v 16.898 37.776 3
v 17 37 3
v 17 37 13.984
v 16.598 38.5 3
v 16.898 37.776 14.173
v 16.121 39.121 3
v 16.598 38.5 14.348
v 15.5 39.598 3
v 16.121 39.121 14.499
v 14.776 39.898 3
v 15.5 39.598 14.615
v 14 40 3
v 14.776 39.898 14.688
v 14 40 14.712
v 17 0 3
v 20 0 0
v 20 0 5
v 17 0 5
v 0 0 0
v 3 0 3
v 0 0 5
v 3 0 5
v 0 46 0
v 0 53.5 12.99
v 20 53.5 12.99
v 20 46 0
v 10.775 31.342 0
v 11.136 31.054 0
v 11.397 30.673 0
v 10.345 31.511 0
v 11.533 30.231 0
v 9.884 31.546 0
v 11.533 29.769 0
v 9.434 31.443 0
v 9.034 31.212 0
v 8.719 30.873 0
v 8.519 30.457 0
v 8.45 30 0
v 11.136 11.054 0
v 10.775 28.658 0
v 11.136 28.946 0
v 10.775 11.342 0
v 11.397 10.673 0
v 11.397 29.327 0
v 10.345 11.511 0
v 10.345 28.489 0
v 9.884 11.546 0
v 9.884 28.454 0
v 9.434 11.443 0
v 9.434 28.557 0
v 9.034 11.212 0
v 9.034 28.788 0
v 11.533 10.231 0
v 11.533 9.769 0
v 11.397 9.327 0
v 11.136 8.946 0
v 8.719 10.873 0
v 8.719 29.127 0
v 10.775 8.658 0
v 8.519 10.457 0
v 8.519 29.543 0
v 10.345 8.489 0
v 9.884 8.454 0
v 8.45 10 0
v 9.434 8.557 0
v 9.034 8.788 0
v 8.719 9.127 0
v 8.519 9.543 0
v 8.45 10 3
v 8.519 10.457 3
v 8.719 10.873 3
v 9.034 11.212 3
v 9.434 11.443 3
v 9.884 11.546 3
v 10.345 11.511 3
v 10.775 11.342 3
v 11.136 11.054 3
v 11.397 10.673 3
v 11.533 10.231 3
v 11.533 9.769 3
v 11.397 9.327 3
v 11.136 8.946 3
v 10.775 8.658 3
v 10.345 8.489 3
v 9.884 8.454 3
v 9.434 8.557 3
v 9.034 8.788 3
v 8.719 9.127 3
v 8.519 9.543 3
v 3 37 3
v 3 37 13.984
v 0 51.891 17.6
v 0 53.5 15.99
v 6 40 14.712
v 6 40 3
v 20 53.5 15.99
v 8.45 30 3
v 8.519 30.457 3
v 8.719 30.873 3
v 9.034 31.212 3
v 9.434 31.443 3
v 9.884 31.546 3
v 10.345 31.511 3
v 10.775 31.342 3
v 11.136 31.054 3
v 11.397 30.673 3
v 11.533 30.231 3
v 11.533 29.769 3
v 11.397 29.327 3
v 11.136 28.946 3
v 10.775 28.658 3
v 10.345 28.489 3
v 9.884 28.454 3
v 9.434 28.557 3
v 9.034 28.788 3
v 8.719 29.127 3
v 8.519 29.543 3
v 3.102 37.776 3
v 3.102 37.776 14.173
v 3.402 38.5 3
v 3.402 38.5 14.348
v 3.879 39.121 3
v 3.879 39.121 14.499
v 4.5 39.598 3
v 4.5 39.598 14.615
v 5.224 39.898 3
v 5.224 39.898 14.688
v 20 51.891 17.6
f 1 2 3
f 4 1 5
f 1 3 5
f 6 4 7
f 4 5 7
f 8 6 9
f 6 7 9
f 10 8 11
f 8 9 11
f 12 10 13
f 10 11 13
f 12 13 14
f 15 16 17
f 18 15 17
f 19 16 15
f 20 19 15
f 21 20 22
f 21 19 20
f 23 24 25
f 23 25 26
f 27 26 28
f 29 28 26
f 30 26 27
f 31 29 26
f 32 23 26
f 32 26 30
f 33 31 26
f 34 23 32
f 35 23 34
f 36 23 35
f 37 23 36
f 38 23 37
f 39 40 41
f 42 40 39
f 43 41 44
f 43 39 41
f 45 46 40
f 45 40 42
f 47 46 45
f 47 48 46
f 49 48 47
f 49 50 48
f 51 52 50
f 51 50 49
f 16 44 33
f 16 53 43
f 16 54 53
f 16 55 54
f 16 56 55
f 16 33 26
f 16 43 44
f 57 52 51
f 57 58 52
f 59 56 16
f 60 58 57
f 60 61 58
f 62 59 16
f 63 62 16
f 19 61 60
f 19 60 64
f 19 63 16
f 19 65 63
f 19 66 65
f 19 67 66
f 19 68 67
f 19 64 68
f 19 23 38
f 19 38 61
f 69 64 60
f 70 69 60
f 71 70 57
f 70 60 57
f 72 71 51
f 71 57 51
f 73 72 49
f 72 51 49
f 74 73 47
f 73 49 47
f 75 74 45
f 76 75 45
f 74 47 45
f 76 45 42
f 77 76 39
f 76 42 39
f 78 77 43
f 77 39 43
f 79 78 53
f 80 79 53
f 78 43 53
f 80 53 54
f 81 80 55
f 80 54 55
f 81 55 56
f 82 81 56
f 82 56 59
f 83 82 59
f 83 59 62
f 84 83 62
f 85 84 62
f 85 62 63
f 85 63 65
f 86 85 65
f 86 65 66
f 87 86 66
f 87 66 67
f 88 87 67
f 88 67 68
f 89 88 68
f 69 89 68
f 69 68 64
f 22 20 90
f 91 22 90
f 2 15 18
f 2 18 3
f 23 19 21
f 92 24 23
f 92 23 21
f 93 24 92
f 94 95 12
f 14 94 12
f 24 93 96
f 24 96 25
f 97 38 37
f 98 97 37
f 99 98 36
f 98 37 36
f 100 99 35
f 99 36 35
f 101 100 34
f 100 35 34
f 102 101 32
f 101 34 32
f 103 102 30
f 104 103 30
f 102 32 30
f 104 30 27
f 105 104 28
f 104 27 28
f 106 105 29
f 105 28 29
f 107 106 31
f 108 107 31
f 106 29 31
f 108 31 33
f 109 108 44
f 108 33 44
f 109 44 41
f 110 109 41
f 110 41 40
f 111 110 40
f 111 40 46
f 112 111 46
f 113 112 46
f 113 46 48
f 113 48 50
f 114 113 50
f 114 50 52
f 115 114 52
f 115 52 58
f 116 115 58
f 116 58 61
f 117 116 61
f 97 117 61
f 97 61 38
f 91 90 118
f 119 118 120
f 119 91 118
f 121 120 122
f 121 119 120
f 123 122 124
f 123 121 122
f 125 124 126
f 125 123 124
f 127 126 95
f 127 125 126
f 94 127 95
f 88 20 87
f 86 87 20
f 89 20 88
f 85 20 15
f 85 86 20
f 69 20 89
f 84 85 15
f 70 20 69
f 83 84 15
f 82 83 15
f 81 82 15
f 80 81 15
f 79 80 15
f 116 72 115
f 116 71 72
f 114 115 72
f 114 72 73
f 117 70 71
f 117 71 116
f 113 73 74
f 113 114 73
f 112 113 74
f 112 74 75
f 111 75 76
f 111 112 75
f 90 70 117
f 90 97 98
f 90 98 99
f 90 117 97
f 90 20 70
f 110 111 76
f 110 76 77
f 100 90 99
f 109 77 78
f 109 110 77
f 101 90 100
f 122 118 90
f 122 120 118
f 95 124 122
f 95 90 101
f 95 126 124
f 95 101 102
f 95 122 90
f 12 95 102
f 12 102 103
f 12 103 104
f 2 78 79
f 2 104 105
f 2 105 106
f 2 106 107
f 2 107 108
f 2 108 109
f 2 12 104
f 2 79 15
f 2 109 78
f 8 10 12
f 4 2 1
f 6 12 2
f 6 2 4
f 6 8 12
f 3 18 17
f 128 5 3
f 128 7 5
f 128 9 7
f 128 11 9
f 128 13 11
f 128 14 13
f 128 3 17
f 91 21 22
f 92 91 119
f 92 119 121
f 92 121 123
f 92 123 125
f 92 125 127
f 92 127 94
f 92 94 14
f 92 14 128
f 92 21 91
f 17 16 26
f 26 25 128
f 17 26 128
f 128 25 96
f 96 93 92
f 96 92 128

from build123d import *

# Parameters (mm, degrees)
BOSS_EXTRUDE1_DEPTH = 20
CUT_EXTRUDE1_START  = -14.990381
SKETCH4_W           = 14
SKETCH4_H           = 40
CUT_EXTRUDE1_DEPTH  = 11.712434
FILLET1_R           = 3
CHAMFER1_SIZE2      = 2
CHAMFER1_SIZE       = 1.656014526
M3_CLEARANCE_D      = 3.099999896


with BuildPart() as part:
    # Sketch1 → Boss-Extrude1 (new body)
    with BuildSketch(Plane(origin=(0, 0, 0), x_dir=(0, 0, -1), z_dir=(1, 0, 0))):
        Polygon((0, 0), (-5, 0), (-17.990381057, 53.5), (-12.990381057, 53.5), (0, 46), align=None)
    extrude(amount=BOSS_EXTRUDE1_DEPTH)

    # Sketch4 → Cut-Extrude1 (cut)
    with BuildSketch(Plane.XY.offset(17.990381057).offset(CUT_EXTRUDE1_START)):
        with Locations((10, 20)):
            Rectangle(SKETCH4_W, SKETCH4_H)
    extrude(amount=CUT_EXTRUDE1_DEPTH, mode=Mode.SUBTRACT)

    # Fillet1
    fillet1_edges = [part.edges().sort_by_distance(p)[0] for p in [
        (3, 40, 8.856217057),
        (17, 40, 8.856217057),
    ]]
    fillet(fillet1_edges, radius=FILLET1_R)

    # Chamfer1
    chamfer1_edges = [part.edges().sort_by_distance(p)[0] for p in [
        (10, 53.5, 17.990381057),
    ]]
    chamfer(chamfer1_edges, length=CHAMFER1_SIZE, length2=CHAMFER1_SIZE2)

    # M3 Clearance (through all)
    with Locations(Plane(origin=(10, 30, 3), x_dir=(1, 0, 0), z_dir=(0, 0, 1))):
        with Locations((0, 0), (0, -20)):
            Hole(M3_CLEARANCE_D / 2)


solid = part.part
